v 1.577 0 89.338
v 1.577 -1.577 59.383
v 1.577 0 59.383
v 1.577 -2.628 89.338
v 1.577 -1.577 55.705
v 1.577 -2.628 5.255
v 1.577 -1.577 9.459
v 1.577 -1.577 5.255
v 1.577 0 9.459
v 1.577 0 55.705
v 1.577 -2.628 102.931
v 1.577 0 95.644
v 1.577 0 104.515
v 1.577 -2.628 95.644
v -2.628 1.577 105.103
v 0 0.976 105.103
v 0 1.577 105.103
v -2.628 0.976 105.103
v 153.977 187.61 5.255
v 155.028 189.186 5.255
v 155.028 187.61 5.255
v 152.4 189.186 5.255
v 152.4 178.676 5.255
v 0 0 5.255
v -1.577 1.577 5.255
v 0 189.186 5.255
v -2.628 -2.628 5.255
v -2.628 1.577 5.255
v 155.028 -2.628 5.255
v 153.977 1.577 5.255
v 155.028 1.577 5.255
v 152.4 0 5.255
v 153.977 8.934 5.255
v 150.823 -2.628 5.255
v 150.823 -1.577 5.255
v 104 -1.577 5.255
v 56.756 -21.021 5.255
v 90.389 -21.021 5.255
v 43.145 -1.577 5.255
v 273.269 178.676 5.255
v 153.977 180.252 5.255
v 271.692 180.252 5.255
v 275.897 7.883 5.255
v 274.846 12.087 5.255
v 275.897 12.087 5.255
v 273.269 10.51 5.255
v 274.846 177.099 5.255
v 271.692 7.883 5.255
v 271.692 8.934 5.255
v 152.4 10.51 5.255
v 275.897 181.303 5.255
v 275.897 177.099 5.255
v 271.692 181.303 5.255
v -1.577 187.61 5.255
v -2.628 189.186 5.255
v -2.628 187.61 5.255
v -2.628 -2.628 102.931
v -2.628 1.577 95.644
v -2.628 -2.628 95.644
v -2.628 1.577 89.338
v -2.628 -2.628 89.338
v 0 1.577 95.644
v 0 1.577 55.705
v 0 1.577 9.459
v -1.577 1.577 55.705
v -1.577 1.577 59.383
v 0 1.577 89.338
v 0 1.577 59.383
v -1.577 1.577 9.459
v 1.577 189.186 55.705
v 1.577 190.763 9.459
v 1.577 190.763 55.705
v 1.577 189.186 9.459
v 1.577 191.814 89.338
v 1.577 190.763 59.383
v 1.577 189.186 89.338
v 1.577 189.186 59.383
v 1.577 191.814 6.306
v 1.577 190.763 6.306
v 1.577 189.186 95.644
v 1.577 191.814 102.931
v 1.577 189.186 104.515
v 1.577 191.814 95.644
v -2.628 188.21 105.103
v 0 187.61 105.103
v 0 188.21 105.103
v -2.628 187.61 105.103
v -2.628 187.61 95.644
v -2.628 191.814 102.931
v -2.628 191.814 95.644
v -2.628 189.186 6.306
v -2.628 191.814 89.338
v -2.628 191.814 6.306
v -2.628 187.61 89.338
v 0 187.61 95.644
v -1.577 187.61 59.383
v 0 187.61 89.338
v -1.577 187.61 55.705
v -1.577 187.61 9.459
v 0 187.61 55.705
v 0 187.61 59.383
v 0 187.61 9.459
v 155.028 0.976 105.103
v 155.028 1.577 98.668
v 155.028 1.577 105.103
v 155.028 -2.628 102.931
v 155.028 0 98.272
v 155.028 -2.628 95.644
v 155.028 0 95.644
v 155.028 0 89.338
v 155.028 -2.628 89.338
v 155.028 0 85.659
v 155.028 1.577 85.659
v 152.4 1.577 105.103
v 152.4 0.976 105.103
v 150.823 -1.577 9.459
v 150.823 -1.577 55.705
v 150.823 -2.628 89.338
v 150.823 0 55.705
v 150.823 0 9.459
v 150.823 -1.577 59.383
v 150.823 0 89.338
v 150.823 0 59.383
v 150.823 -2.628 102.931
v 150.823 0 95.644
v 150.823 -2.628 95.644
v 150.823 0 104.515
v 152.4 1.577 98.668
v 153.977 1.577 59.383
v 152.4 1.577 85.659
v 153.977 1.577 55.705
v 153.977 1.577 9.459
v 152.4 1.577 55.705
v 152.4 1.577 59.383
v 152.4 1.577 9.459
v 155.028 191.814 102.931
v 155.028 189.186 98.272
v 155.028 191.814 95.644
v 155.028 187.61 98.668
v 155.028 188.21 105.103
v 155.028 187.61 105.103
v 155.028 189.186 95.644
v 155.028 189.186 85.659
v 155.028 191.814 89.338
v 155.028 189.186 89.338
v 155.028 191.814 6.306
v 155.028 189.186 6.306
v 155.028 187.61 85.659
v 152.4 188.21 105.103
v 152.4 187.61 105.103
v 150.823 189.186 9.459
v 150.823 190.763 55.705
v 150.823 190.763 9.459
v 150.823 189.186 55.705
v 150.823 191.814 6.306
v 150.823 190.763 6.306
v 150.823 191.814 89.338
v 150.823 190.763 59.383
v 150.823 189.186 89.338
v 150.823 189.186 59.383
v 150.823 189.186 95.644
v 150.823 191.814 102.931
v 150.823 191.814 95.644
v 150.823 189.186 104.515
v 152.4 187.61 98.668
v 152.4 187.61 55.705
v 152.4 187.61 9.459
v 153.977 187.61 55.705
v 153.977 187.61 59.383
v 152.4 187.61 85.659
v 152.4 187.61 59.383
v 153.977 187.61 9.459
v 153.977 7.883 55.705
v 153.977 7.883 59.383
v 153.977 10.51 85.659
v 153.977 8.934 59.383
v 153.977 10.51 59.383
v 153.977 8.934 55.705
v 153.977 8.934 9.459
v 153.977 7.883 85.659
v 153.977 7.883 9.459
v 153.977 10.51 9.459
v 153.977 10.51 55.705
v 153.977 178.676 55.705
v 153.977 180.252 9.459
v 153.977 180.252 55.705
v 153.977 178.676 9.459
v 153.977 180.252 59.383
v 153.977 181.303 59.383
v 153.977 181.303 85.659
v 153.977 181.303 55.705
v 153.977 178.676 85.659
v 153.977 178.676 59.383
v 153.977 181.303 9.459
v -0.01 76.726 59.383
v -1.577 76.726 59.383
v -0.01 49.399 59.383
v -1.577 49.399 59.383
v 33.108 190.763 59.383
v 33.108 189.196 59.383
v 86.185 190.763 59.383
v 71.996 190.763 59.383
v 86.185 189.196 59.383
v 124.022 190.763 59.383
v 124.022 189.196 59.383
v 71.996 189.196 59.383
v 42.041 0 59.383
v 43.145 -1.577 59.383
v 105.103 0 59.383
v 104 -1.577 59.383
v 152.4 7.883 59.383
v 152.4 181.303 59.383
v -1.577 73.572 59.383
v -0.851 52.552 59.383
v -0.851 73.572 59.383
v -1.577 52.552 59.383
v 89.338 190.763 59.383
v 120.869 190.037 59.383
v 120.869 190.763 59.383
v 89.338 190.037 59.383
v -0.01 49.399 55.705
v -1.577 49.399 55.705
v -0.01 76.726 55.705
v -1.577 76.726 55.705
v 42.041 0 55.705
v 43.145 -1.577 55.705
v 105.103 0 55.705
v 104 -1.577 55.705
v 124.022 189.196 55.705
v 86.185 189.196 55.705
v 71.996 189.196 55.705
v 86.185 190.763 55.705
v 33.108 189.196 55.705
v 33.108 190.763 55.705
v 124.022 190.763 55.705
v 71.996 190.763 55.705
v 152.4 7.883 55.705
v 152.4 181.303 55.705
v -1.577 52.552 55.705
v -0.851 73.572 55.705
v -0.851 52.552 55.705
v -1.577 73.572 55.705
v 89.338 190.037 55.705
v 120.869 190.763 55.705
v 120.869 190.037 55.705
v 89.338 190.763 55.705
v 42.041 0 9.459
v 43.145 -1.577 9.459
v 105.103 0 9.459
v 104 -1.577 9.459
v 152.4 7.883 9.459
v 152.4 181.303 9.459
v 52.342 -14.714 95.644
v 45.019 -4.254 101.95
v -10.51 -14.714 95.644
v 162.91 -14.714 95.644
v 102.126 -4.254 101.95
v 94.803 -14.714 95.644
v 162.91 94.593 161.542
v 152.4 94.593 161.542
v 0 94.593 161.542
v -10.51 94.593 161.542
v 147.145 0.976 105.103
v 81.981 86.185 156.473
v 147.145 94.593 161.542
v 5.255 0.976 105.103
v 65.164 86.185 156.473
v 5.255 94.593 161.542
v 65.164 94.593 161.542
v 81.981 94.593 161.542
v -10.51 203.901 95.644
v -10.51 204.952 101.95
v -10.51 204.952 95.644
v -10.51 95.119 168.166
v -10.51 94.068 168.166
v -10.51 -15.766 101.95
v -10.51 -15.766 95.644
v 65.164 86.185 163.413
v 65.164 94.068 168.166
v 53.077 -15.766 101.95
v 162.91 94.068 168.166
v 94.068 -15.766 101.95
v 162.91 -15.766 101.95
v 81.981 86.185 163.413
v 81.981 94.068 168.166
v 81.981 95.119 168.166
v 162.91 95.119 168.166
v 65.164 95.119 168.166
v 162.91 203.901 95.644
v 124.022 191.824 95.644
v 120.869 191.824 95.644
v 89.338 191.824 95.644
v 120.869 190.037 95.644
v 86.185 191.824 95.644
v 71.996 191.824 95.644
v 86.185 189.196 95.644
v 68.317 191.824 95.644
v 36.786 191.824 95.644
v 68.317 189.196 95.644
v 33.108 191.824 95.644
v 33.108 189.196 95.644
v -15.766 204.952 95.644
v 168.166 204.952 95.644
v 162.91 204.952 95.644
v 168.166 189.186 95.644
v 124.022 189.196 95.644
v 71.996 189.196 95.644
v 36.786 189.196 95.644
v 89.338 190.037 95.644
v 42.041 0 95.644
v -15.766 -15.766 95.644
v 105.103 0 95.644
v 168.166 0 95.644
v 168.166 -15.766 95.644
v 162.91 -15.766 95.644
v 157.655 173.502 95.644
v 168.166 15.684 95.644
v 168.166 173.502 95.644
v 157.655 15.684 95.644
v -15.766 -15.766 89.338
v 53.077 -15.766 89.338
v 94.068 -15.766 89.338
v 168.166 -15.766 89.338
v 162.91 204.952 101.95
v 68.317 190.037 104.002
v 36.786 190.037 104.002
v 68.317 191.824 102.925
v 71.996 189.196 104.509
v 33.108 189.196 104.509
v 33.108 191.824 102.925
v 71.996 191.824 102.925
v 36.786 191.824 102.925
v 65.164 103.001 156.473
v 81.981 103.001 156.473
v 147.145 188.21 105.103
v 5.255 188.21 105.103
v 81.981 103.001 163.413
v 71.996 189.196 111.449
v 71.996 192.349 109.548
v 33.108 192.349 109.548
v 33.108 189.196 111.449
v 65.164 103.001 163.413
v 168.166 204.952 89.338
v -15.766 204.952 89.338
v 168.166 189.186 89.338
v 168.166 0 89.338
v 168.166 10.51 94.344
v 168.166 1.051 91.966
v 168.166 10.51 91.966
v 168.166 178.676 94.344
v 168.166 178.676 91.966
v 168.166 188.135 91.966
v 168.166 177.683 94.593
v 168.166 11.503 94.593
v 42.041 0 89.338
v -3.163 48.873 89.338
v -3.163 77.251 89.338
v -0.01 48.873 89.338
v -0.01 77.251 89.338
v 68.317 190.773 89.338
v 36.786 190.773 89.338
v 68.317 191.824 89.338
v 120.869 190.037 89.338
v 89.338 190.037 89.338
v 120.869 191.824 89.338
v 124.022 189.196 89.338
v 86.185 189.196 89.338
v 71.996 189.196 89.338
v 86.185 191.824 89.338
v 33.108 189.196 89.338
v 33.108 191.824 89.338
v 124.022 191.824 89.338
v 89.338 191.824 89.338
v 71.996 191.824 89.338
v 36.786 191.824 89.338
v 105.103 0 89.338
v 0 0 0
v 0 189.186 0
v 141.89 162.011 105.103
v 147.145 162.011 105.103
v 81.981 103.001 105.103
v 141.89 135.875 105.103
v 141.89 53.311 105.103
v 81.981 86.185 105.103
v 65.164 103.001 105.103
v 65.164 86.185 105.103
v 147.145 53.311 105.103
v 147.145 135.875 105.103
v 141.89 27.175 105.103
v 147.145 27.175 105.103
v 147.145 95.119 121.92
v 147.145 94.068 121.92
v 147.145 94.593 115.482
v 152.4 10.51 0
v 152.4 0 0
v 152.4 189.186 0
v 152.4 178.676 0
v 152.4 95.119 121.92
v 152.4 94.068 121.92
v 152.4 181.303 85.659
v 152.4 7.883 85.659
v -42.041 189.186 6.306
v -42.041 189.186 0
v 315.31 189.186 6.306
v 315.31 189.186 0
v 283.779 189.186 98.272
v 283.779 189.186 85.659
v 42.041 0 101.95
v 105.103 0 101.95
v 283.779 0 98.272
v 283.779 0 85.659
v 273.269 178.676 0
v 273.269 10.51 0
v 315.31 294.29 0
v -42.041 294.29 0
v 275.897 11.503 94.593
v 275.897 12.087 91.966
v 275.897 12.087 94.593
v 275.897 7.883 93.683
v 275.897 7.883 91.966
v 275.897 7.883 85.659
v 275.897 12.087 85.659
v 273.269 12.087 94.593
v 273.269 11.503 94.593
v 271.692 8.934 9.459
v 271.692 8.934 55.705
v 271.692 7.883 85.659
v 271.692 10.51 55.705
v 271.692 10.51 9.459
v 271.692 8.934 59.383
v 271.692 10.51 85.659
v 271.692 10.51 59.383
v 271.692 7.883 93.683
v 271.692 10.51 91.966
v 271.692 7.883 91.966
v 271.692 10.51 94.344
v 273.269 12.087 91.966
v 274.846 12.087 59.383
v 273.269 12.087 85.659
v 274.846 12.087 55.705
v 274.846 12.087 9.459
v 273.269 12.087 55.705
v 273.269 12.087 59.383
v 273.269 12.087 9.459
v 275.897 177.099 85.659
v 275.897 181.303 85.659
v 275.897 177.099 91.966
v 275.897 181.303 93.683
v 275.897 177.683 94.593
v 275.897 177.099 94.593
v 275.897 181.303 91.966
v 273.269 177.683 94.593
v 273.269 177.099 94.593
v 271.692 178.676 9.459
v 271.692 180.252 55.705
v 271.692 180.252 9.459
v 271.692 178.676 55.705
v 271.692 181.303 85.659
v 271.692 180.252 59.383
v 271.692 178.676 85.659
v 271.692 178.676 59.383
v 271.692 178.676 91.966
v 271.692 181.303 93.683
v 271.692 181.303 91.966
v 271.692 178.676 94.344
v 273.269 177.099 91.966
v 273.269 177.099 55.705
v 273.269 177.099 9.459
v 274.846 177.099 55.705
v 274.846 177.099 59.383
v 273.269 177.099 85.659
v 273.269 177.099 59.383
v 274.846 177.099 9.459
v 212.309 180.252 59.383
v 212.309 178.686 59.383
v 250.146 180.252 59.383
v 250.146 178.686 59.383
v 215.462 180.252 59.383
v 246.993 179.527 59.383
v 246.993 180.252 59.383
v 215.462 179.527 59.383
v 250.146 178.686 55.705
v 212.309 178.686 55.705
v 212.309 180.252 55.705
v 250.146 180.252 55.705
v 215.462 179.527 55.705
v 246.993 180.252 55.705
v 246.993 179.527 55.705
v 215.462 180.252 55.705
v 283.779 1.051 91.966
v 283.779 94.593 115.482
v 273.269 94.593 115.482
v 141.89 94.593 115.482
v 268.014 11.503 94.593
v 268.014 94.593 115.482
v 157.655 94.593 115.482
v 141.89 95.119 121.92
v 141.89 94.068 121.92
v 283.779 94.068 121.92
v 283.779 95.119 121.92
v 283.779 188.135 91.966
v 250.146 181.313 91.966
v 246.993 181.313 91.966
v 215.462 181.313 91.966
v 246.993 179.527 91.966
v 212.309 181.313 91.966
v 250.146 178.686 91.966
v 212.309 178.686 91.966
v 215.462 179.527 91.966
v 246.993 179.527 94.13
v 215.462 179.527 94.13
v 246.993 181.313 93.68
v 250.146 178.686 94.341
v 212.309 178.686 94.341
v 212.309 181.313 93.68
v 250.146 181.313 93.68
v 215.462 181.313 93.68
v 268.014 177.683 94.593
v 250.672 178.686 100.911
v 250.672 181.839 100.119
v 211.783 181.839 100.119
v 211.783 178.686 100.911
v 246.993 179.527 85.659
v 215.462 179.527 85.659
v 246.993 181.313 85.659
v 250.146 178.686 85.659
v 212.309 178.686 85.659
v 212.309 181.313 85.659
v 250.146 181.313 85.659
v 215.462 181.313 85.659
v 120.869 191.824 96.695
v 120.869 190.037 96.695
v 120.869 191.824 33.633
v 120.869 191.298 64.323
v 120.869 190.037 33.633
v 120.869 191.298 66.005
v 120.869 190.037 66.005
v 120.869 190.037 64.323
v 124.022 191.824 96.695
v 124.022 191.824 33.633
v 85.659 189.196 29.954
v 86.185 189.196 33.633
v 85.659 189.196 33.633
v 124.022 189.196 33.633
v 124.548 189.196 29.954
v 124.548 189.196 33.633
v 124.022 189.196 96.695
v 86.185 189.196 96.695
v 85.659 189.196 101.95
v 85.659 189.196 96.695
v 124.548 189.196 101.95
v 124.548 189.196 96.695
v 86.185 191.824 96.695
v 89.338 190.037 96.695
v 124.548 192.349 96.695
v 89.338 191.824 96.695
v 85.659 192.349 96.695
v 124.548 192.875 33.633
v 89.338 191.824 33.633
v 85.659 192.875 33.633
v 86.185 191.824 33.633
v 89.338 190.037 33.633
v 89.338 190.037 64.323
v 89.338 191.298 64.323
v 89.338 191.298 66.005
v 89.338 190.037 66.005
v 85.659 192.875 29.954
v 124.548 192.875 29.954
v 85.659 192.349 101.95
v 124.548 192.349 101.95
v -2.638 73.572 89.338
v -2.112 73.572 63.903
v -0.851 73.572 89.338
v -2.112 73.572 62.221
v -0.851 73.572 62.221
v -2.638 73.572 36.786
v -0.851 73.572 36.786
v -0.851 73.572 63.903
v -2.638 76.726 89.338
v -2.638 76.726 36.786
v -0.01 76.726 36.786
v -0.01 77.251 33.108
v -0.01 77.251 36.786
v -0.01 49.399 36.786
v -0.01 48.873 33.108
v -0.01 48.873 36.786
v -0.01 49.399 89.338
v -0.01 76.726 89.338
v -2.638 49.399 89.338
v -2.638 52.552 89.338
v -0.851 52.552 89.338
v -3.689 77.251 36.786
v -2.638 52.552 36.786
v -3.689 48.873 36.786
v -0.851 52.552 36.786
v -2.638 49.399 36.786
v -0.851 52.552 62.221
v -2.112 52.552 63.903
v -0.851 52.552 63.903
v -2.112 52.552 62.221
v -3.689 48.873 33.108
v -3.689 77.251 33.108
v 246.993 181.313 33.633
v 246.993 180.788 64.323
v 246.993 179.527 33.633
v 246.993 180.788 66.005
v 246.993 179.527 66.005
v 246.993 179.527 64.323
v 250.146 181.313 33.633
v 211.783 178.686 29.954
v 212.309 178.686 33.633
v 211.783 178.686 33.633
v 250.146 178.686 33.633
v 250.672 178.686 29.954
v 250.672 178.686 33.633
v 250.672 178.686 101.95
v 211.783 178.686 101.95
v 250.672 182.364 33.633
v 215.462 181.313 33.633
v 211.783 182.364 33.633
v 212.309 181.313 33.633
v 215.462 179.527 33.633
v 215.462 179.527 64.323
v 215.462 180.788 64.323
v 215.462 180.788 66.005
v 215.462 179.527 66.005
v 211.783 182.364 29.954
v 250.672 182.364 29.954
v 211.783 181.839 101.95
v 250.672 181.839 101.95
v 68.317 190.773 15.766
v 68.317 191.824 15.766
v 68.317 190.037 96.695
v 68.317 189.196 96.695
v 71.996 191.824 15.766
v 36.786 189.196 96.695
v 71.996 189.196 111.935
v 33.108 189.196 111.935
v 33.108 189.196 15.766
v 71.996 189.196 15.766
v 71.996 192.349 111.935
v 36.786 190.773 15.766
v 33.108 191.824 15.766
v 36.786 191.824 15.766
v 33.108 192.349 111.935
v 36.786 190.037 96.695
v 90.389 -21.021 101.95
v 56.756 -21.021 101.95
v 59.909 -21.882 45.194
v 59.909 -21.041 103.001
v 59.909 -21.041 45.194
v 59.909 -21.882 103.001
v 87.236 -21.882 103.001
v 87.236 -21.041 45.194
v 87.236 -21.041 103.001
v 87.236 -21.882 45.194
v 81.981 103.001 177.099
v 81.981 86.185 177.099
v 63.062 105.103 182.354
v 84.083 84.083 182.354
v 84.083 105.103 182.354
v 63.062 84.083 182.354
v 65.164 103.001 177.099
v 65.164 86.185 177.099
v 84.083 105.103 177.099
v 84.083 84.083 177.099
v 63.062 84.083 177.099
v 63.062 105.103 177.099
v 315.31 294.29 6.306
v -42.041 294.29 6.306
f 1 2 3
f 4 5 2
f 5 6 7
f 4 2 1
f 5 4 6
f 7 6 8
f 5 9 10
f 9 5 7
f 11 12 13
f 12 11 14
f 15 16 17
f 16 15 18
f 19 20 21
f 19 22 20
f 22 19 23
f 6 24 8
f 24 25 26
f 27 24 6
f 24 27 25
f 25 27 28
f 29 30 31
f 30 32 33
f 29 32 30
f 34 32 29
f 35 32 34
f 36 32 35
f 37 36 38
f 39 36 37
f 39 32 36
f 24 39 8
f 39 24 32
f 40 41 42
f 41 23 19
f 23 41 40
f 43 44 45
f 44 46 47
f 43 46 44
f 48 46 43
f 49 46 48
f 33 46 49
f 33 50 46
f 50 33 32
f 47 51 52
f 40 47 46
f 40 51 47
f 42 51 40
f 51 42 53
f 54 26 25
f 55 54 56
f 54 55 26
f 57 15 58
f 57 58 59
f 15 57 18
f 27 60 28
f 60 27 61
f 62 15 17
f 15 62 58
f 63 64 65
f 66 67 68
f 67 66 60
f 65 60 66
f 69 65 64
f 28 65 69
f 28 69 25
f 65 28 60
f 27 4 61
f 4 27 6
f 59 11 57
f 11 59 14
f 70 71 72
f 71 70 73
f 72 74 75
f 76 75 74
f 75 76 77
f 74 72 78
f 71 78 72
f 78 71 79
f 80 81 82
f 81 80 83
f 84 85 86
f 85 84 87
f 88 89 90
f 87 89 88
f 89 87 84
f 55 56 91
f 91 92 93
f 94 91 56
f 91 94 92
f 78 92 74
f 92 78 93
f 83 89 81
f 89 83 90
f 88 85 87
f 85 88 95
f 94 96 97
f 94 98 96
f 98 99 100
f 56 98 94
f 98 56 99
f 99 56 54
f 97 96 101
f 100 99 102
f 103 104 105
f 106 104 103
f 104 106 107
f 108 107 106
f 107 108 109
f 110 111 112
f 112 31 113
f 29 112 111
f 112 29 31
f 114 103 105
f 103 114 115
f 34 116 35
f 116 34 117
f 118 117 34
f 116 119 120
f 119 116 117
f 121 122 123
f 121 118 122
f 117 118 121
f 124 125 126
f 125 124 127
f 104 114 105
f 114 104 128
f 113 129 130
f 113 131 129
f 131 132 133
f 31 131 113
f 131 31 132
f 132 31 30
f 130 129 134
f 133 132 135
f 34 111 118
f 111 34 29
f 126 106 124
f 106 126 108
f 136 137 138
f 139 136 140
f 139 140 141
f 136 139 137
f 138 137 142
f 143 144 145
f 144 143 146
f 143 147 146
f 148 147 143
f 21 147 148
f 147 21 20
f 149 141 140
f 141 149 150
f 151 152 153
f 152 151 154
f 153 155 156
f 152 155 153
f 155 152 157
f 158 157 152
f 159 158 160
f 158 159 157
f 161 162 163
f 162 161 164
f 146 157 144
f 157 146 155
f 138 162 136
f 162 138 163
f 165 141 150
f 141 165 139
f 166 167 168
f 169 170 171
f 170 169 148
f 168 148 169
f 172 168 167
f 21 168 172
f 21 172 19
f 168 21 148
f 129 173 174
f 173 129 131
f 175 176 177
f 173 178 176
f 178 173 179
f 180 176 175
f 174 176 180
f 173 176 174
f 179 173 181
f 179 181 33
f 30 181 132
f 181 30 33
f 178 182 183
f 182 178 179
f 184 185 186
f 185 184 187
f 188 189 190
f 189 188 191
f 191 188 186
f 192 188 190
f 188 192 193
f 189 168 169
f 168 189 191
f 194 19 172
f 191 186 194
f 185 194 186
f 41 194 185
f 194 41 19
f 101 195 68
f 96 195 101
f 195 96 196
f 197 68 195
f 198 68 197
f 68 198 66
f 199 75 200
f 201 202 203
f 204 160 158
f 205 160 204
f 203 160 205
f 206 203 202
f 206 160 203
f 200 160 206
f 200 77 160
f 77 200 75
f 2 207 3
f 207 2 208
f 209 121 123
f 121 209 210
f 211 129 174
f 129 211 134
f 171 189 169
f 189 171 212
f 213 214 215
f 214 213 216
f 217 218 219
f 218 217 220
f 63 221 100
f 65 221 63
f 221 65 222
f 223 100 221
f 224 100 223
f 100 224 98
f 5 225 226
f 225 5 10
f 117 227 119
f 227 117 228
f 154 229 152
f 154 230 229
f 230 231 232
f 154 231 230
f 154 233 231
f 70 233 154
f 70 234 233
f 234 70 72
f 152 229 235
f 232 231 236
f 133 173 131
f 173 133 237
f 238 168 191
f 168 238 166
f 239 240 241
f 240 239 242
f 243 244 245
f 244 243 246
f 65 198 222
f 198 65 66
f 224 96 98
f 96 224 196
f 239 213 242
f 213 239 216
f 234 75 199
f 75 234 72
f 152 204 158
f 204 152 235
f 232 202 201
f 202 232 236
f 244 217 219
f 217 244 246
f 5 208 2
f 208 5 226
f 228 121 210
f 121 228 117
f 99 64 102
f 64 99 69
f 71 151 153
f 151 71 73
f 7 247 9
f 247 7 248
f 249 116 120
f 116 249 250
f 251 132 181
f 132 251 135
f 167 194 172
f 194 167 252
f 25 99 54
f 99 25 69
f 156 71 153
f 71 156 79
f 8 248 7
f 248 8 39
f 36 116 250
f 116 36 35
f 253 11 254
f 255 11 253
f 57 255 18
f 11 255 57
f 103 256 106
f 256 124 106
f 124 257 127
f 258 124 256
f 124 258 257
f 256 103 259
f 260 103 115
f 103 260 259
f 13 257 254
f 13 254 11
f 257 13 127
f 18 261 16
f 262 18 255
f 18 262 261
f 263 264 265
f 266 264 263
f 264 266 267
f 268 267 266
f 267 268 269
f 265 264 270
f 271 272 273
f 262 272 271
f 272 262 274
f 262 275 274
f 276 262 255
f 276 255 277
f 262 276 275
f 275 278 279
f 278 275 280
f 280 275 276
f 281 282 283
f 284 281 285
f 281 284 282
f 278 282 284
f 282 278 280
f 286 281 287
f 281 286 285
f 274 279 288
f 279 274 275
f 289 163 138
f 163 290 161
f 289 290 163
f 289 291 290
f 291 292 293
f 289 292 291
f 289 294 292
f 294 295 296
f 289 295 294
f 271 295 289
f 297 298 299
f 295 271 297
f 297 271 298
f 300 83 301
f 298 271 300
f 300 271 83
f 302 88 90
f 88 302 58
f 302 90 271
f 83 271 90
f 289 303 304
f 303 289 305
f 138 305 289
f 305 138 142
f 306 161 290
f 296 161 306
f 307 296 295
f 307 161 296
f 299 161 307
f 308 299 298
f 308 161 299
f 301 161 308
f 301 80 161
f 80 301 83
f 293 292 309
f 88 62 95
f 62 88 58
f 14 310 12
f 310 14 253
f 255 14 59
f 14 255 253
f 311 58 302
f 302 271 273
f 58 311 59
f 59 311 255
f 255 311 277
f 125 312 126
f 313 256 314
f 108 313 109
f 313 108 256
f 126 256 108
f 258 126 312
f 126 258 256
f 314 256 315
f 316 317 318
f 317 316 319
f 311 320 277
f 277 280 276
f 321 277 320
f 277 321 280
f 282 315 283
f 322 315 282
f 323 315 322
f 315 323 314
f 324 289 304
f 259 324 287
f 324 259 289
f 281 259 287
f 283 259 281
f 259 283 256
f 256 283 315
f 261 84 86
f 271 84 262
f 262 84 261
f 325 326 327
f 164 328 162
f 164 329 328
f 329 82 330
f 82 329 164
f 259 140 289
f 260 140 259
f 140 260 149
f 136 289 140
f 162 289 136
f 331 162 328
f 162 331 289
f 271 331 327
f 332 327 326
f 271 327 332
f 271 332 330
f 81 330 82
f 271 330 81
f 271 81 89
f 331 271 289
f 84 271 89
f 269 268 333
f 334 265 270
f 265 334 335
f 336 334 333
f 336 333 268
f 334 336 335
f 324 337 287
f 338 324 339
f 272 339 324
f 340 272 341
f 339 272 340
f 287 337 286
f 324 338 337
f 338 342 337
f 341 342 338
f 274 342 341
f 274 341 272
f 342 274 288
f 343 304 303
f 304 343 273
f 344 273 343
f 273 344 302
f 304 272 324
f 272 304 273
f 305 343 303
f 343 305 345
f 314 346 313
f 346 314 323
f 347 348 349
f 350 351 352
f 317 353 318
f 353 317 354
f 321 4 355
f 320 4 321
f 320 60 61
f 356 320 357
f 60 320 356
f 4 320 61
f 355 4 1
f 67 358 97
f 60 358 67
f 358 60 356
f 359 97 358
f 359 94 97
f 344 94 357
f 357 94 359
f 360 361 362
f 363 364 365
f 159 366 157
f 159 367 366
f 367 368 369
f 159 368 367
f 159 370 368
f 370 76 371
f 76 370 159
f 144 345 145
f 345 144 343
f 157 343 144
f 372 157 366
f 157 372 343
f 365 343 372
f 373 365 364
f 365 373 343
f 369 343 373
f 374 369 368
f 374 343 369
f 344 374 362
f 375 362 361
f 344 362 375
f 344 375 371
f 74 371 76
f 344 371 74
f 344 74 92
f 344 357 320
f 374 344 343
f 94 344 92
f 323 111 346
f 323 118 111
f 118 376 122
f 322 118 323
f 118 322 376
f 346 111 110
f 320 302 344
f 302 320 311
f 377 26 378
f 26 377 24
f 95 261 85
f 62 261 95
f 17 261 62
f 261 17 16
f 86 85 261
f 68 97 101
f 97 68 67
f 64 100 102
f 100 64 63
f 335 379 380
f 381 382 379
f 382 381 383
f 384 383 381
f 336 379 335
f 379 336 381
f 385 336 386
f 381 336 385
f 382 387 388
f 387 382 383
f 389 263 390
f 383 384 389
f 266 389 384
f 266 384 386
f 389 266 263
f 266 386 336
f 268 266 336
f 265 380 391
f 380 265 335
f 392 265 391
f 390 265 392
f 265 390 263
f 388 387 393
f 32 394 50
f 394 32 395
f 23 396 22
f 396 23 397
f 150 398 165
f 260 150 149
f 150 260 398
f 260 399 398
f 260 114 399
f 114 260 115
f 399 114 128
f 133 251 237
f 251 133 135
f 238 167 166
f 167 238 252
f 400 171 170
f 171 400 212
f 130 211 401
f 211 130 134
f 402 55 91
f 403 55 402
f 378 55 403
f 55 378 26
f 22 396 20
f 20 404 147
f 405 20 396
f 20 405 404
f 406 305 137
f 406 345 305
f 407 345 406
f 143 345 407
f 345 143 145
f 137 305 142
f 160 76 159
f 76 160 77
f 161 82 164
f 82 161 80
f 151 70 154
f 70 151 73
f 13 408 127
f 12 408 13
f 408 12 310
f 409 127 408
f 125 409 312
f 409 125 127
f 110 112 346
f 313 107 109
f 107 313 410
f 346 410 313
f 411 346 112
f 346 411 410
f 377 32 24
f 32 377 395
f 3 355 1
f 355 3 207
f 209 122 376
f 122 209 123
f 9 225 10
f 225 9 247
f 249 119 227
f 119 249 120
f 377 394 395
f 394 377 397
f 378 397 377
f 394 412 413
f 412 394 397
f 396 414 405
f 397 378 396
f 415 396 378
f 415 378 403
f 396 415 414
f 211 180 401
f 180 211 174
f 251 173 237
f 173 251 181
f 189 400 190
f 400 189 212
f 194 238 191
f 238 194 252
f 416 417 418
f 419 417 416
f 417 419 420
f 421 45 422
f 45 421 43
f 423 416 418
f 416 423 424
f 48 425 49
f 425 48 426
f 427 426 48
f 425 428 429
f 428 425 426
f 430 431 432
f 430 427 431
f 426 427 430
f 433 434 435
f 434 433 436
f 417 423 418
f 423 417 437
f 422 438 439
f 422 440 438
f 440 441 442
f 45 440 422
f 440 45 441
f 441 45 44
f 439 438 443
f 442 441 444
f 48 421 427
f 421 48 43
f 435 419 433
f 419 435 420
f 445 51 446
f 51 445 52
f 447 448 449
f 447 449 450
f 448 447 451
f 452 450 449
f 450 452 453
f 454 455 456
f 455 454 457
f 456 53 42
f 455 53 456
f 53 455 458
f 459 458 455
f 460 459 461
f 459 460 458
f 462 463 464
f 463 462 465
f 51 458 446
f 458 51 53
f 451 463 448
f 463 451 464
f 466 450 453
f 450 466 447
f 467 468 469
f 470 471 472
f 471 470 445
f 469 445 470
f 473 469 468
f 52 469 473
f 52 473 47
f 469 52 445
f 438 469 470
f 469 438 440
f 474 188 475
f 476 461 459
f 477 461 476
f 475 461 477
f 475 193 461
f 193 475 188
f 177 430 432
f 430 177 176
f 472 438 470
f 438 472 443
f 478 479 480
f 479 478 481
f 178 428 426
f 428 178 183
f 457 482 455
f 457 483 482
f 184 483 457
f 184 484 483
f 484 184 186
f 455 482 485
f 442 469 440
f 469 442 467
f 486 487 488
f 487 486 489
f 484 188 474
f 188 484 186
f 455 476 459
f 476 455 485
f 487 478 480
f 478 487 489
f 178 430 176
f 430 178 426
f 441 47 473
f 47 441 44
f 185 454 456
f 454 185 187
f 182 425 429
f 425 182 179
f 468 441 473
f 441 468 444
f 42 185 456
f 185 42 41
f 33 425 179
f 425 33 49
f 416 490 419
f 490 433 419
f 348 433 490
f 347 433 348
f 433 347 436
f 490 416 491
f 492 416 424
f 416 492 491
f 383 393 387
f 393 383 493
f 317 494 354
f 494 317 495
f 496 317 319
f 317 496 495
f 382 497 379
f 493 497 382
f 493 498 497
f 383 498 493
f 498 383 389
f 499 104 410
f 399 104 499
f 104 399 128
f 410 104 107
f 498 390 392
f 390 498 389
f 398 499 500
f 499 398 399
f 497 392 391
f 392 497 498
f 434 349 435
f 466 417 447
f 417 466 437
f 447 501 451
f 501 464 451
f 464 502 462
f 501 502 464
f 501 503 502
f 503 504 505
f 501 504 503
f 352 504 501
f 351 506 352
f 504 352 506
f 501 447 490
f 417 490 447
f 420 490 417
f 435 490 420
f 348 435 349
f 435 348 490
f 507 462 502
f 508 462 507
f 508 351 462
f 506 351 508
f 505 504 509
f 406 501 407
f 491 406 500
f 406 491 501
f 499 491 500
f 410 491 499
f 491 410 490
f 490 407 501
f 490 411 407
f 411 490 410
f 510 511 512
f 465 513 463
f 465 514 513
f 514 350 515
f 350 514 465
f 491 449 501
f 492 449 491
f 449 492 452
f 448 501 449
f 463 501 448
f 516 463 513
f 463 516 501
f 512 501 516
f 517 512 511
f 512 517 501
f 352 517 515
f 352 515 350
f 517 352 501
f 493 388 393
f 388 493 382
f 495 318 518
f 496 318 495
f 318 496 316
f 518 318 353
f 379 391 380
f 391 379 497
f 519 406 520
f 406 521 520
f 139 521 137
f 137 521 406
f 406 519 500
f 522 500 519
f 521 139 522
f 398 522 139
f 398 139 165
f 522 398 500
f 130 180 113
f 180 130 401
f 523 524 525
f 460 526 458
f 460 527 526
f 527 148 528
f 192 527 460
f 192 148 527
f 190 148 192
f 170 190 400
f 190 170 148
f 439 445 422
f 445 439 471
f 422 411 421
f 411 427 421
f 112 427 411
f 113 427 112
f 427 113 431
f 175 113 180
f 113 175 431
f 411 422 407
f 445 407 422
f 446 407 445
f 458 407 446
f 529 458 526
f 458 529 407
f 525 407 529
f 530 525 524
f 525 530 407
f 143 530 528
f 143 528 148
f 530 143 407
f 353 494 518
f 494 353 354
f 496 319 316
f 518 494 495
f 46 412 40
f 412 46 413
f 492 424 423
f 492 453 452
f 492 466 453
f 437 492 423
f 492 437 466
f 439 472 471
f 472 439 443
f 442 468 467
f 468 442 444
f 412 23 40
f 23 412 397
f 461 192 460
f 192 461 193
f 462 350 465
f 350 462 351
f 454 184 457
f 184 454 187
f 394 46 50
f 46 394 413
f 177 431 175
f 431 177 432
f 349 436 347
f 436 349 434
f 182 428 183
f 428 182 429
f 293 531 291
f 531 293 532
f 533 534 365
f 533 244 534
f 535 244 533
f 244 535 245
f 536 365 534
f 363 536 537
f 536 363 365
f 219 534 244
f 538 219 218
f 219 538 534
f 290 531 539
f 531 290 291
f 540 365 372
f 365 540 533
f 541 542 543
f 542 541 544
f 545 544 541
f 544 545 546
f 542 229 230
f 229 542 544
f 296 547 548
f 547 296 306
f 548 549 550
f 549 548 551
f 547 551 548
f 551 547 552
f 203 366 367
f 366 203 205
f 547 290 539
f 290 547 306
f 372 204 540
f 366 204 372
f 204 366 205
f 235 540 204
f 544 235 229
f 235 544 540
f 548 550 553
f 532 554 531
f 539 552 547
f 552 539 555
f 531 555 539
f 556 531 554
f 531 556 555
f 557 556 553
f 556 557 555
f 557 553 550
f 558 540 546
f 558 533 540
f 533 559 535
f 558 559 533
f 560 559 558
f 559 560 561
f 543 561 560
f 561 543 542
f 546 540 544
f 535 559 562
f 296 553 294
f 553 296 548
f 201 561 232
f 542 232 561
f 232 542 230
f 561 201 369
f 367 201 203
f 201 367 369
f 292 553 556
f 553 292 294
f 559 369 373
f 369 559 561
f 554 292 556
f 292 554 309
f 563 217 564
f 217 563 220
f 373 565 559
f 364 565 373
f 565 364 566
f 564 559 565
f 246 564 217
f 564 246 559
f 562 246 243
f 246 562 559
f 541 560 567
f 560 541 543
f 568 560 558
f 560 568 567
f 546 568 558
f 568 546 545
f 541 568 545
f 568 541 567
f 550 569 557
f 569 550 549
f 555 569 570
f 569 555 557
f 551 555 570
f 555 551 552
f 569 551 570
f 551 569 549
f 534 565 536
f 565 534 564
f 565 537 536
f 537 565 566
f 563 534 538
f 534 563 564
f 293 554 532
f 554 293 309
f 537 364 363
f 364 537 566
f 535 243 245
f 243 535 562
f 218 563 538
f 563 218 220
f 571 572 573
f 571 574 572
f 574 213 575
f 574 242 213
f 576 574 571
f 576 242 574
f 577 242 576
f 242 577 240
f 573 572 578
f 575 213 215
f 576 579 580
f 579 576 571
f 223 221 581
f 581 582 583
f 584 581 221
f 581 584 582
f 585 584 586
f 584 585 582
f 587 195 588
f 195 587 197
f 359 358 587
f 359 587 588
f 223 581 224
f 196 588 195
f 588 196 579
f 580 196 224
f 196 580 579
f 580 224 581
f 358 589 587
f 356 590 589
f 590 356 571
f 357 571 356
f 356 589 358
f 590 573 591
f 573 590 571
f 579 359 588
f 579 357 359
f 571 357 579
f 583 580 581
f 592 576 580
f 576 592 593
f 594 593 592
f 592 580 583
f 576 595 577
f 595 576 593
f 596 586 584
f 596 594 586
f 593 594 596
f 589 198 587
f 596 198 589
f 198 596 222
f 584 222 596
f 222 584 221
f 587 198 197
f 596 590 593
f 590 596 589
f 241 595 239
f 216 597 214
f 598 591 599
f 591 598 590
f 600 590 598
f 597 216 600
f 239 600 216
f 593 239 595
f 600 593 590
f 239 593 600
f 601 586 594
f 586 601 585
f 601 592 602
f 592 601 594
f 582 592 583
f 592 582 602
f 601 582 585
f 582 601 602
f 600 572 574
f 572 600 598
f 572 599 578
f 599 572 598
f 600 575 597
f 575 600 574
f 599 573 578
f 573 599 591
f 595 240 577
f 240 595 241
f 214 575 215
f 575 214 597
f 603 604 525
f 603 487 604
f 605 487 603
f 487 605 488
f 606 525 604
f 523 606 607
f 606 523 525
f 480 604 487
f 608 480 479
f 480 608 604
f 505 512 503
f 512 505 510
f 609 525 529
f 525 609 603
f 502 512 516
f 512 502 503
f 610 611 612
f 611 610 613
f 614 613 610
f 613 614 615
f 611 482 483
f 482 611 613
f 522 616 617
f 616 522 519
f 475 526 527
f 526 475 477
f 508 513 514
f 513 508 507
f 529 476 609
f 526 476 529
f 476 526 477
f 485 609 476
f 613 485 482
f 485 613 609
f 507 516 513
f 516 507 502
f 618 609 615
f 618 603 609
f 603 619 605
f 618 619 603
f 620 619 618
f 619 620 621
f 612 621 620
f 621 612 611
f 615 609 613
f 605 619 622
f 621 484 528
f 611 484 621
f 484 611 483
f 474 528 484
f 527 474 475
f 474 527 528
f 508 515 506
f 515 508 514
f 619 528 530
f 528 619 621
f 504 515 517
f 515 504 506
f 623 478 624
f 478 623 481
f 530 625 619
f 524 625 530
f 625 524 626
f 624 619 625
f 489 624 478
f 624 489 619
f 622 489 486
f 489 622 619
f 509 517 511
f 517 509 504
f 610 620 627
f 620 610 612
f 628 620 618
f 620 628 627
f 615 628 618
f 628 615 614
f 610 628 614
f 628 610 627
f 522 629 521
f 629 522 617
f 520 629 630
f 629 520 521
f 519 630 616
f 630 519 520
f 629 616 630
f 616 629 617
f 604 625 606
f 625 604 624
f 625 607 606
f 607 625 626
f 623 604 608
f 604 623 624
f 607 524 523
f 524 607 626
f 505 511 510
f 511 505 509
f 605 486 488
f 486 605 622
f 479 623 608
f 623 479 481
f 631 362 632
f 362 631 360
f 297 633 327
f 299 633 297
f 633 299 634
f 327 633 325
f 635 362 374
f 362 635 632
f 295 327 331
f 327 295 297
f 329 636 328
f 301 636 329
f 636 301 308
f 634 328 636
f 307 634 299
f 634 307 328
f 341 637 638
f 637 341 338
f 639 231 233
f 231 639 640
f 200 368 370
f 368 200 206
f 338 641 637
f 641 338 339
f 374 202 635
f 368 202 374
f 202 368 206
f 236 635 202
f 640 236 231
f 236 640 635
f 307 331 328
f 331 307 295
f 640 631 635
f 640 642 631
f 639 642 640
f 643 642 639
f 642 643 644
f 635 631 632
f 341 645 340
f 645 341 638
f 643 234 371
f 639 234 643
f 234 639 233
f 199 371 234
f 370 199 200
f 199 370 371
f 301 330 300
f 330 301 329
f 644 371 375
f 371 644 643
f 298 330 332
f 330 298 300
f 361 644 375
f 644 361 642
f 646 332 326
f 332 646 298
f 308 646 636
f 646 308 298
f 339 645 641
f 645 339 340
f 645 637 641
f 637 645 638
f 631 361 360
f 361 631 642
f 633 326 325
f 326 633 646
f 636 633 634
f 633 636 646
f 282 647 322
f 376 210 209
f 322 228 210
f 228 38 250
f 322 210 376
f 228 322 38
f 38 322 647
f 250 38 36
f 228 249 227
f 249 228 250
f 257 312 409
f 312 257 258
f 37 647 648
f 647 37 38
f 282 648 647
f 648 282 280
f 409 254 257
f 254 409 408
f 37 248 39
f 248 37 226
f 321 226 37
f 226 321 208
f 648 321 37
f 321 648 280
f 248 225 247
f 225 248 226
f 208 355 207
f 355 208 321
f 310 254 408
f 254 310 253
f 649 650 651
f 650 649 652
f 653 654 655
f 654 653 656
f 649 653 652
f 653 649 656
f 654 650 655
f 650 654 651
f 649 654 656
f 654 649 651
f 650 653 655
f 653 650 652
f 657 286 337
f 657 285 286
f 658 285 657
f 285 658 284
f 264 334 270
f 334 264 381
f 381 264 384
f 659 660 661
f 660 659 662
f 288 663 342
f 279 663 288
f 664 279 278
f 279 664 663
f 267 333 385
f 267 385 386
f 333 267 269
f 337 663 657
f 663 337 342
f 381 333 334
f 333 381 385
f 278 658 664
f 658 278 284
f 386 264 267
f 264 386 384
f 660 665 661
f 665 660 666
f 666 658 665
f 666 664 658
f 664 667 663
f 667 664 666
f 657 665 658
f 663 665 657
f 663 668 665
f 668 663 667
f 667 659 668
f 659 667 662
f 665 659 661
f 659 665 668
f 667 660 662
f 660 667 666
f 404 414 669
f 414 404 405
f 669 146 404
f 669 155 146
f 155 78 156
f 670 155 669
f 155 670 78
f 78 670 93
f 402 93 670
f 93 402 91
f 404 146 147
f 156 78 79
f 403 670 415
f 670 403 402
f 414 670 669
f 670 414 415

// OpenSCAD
// =====================================================================
//  MILWAUKEE ROAD - SMALL PASSENGER STATION, WEBSTER, MINN. (C.M.&ST.P. ENGINEERING DEPT., BUILT 1916)
//  Album of Depot Plans (1919), sheet 21. Private reference (in copyright):
//  Research Library / RSW / Stations / Standard depots / Album of Depot Plans 1919.
//  Rib Side Works, 24 Nov 2026. FIRST SHAPE MODEL for review - not cut into print sections.
//  KNOWN (from the sheet): 26 x 18 ft; office 11 ft 6 with bay, waiting room, freight room 11 ft 6; gable roof (asbestos shingle) with lean-to over the freight end, 6 in drop siding.
//  ESTIMATE: wall and ridge heights (sheets are small copies), window spacing, colours.
//  Shared depot builder ../../../_common/rsw_depot.scad (x along the track, y = 0 town side,
//  track side +y, feet).  SCALE: 29 = G, 48 = O, 87 = HO.
// =====================================================================
SCALE = 29;
include <../../../_common/rsw_depot.scad>

depot(blocks = [[0, 14.5, 0, 18, 10, 0.6, 1, 1.5, 0], [14.5, 11.5, 1, 16, 9, 0.25, 1, 1, 0]],
      pavs   = [],
      wins   = [[10, 1, 3, 6, 3.2], [6, 2, 2, 5, 3.5], [22, 1, 3, 6, 3.2, 1]],
      doors  = [[5, 1, 3, 7.5, 0]],
      bays   = [[7, 0, 6, 2]],
      chims  = [[7, 9, 17.35]],
      plat   = [-4, 34, 10, 0.6]);
